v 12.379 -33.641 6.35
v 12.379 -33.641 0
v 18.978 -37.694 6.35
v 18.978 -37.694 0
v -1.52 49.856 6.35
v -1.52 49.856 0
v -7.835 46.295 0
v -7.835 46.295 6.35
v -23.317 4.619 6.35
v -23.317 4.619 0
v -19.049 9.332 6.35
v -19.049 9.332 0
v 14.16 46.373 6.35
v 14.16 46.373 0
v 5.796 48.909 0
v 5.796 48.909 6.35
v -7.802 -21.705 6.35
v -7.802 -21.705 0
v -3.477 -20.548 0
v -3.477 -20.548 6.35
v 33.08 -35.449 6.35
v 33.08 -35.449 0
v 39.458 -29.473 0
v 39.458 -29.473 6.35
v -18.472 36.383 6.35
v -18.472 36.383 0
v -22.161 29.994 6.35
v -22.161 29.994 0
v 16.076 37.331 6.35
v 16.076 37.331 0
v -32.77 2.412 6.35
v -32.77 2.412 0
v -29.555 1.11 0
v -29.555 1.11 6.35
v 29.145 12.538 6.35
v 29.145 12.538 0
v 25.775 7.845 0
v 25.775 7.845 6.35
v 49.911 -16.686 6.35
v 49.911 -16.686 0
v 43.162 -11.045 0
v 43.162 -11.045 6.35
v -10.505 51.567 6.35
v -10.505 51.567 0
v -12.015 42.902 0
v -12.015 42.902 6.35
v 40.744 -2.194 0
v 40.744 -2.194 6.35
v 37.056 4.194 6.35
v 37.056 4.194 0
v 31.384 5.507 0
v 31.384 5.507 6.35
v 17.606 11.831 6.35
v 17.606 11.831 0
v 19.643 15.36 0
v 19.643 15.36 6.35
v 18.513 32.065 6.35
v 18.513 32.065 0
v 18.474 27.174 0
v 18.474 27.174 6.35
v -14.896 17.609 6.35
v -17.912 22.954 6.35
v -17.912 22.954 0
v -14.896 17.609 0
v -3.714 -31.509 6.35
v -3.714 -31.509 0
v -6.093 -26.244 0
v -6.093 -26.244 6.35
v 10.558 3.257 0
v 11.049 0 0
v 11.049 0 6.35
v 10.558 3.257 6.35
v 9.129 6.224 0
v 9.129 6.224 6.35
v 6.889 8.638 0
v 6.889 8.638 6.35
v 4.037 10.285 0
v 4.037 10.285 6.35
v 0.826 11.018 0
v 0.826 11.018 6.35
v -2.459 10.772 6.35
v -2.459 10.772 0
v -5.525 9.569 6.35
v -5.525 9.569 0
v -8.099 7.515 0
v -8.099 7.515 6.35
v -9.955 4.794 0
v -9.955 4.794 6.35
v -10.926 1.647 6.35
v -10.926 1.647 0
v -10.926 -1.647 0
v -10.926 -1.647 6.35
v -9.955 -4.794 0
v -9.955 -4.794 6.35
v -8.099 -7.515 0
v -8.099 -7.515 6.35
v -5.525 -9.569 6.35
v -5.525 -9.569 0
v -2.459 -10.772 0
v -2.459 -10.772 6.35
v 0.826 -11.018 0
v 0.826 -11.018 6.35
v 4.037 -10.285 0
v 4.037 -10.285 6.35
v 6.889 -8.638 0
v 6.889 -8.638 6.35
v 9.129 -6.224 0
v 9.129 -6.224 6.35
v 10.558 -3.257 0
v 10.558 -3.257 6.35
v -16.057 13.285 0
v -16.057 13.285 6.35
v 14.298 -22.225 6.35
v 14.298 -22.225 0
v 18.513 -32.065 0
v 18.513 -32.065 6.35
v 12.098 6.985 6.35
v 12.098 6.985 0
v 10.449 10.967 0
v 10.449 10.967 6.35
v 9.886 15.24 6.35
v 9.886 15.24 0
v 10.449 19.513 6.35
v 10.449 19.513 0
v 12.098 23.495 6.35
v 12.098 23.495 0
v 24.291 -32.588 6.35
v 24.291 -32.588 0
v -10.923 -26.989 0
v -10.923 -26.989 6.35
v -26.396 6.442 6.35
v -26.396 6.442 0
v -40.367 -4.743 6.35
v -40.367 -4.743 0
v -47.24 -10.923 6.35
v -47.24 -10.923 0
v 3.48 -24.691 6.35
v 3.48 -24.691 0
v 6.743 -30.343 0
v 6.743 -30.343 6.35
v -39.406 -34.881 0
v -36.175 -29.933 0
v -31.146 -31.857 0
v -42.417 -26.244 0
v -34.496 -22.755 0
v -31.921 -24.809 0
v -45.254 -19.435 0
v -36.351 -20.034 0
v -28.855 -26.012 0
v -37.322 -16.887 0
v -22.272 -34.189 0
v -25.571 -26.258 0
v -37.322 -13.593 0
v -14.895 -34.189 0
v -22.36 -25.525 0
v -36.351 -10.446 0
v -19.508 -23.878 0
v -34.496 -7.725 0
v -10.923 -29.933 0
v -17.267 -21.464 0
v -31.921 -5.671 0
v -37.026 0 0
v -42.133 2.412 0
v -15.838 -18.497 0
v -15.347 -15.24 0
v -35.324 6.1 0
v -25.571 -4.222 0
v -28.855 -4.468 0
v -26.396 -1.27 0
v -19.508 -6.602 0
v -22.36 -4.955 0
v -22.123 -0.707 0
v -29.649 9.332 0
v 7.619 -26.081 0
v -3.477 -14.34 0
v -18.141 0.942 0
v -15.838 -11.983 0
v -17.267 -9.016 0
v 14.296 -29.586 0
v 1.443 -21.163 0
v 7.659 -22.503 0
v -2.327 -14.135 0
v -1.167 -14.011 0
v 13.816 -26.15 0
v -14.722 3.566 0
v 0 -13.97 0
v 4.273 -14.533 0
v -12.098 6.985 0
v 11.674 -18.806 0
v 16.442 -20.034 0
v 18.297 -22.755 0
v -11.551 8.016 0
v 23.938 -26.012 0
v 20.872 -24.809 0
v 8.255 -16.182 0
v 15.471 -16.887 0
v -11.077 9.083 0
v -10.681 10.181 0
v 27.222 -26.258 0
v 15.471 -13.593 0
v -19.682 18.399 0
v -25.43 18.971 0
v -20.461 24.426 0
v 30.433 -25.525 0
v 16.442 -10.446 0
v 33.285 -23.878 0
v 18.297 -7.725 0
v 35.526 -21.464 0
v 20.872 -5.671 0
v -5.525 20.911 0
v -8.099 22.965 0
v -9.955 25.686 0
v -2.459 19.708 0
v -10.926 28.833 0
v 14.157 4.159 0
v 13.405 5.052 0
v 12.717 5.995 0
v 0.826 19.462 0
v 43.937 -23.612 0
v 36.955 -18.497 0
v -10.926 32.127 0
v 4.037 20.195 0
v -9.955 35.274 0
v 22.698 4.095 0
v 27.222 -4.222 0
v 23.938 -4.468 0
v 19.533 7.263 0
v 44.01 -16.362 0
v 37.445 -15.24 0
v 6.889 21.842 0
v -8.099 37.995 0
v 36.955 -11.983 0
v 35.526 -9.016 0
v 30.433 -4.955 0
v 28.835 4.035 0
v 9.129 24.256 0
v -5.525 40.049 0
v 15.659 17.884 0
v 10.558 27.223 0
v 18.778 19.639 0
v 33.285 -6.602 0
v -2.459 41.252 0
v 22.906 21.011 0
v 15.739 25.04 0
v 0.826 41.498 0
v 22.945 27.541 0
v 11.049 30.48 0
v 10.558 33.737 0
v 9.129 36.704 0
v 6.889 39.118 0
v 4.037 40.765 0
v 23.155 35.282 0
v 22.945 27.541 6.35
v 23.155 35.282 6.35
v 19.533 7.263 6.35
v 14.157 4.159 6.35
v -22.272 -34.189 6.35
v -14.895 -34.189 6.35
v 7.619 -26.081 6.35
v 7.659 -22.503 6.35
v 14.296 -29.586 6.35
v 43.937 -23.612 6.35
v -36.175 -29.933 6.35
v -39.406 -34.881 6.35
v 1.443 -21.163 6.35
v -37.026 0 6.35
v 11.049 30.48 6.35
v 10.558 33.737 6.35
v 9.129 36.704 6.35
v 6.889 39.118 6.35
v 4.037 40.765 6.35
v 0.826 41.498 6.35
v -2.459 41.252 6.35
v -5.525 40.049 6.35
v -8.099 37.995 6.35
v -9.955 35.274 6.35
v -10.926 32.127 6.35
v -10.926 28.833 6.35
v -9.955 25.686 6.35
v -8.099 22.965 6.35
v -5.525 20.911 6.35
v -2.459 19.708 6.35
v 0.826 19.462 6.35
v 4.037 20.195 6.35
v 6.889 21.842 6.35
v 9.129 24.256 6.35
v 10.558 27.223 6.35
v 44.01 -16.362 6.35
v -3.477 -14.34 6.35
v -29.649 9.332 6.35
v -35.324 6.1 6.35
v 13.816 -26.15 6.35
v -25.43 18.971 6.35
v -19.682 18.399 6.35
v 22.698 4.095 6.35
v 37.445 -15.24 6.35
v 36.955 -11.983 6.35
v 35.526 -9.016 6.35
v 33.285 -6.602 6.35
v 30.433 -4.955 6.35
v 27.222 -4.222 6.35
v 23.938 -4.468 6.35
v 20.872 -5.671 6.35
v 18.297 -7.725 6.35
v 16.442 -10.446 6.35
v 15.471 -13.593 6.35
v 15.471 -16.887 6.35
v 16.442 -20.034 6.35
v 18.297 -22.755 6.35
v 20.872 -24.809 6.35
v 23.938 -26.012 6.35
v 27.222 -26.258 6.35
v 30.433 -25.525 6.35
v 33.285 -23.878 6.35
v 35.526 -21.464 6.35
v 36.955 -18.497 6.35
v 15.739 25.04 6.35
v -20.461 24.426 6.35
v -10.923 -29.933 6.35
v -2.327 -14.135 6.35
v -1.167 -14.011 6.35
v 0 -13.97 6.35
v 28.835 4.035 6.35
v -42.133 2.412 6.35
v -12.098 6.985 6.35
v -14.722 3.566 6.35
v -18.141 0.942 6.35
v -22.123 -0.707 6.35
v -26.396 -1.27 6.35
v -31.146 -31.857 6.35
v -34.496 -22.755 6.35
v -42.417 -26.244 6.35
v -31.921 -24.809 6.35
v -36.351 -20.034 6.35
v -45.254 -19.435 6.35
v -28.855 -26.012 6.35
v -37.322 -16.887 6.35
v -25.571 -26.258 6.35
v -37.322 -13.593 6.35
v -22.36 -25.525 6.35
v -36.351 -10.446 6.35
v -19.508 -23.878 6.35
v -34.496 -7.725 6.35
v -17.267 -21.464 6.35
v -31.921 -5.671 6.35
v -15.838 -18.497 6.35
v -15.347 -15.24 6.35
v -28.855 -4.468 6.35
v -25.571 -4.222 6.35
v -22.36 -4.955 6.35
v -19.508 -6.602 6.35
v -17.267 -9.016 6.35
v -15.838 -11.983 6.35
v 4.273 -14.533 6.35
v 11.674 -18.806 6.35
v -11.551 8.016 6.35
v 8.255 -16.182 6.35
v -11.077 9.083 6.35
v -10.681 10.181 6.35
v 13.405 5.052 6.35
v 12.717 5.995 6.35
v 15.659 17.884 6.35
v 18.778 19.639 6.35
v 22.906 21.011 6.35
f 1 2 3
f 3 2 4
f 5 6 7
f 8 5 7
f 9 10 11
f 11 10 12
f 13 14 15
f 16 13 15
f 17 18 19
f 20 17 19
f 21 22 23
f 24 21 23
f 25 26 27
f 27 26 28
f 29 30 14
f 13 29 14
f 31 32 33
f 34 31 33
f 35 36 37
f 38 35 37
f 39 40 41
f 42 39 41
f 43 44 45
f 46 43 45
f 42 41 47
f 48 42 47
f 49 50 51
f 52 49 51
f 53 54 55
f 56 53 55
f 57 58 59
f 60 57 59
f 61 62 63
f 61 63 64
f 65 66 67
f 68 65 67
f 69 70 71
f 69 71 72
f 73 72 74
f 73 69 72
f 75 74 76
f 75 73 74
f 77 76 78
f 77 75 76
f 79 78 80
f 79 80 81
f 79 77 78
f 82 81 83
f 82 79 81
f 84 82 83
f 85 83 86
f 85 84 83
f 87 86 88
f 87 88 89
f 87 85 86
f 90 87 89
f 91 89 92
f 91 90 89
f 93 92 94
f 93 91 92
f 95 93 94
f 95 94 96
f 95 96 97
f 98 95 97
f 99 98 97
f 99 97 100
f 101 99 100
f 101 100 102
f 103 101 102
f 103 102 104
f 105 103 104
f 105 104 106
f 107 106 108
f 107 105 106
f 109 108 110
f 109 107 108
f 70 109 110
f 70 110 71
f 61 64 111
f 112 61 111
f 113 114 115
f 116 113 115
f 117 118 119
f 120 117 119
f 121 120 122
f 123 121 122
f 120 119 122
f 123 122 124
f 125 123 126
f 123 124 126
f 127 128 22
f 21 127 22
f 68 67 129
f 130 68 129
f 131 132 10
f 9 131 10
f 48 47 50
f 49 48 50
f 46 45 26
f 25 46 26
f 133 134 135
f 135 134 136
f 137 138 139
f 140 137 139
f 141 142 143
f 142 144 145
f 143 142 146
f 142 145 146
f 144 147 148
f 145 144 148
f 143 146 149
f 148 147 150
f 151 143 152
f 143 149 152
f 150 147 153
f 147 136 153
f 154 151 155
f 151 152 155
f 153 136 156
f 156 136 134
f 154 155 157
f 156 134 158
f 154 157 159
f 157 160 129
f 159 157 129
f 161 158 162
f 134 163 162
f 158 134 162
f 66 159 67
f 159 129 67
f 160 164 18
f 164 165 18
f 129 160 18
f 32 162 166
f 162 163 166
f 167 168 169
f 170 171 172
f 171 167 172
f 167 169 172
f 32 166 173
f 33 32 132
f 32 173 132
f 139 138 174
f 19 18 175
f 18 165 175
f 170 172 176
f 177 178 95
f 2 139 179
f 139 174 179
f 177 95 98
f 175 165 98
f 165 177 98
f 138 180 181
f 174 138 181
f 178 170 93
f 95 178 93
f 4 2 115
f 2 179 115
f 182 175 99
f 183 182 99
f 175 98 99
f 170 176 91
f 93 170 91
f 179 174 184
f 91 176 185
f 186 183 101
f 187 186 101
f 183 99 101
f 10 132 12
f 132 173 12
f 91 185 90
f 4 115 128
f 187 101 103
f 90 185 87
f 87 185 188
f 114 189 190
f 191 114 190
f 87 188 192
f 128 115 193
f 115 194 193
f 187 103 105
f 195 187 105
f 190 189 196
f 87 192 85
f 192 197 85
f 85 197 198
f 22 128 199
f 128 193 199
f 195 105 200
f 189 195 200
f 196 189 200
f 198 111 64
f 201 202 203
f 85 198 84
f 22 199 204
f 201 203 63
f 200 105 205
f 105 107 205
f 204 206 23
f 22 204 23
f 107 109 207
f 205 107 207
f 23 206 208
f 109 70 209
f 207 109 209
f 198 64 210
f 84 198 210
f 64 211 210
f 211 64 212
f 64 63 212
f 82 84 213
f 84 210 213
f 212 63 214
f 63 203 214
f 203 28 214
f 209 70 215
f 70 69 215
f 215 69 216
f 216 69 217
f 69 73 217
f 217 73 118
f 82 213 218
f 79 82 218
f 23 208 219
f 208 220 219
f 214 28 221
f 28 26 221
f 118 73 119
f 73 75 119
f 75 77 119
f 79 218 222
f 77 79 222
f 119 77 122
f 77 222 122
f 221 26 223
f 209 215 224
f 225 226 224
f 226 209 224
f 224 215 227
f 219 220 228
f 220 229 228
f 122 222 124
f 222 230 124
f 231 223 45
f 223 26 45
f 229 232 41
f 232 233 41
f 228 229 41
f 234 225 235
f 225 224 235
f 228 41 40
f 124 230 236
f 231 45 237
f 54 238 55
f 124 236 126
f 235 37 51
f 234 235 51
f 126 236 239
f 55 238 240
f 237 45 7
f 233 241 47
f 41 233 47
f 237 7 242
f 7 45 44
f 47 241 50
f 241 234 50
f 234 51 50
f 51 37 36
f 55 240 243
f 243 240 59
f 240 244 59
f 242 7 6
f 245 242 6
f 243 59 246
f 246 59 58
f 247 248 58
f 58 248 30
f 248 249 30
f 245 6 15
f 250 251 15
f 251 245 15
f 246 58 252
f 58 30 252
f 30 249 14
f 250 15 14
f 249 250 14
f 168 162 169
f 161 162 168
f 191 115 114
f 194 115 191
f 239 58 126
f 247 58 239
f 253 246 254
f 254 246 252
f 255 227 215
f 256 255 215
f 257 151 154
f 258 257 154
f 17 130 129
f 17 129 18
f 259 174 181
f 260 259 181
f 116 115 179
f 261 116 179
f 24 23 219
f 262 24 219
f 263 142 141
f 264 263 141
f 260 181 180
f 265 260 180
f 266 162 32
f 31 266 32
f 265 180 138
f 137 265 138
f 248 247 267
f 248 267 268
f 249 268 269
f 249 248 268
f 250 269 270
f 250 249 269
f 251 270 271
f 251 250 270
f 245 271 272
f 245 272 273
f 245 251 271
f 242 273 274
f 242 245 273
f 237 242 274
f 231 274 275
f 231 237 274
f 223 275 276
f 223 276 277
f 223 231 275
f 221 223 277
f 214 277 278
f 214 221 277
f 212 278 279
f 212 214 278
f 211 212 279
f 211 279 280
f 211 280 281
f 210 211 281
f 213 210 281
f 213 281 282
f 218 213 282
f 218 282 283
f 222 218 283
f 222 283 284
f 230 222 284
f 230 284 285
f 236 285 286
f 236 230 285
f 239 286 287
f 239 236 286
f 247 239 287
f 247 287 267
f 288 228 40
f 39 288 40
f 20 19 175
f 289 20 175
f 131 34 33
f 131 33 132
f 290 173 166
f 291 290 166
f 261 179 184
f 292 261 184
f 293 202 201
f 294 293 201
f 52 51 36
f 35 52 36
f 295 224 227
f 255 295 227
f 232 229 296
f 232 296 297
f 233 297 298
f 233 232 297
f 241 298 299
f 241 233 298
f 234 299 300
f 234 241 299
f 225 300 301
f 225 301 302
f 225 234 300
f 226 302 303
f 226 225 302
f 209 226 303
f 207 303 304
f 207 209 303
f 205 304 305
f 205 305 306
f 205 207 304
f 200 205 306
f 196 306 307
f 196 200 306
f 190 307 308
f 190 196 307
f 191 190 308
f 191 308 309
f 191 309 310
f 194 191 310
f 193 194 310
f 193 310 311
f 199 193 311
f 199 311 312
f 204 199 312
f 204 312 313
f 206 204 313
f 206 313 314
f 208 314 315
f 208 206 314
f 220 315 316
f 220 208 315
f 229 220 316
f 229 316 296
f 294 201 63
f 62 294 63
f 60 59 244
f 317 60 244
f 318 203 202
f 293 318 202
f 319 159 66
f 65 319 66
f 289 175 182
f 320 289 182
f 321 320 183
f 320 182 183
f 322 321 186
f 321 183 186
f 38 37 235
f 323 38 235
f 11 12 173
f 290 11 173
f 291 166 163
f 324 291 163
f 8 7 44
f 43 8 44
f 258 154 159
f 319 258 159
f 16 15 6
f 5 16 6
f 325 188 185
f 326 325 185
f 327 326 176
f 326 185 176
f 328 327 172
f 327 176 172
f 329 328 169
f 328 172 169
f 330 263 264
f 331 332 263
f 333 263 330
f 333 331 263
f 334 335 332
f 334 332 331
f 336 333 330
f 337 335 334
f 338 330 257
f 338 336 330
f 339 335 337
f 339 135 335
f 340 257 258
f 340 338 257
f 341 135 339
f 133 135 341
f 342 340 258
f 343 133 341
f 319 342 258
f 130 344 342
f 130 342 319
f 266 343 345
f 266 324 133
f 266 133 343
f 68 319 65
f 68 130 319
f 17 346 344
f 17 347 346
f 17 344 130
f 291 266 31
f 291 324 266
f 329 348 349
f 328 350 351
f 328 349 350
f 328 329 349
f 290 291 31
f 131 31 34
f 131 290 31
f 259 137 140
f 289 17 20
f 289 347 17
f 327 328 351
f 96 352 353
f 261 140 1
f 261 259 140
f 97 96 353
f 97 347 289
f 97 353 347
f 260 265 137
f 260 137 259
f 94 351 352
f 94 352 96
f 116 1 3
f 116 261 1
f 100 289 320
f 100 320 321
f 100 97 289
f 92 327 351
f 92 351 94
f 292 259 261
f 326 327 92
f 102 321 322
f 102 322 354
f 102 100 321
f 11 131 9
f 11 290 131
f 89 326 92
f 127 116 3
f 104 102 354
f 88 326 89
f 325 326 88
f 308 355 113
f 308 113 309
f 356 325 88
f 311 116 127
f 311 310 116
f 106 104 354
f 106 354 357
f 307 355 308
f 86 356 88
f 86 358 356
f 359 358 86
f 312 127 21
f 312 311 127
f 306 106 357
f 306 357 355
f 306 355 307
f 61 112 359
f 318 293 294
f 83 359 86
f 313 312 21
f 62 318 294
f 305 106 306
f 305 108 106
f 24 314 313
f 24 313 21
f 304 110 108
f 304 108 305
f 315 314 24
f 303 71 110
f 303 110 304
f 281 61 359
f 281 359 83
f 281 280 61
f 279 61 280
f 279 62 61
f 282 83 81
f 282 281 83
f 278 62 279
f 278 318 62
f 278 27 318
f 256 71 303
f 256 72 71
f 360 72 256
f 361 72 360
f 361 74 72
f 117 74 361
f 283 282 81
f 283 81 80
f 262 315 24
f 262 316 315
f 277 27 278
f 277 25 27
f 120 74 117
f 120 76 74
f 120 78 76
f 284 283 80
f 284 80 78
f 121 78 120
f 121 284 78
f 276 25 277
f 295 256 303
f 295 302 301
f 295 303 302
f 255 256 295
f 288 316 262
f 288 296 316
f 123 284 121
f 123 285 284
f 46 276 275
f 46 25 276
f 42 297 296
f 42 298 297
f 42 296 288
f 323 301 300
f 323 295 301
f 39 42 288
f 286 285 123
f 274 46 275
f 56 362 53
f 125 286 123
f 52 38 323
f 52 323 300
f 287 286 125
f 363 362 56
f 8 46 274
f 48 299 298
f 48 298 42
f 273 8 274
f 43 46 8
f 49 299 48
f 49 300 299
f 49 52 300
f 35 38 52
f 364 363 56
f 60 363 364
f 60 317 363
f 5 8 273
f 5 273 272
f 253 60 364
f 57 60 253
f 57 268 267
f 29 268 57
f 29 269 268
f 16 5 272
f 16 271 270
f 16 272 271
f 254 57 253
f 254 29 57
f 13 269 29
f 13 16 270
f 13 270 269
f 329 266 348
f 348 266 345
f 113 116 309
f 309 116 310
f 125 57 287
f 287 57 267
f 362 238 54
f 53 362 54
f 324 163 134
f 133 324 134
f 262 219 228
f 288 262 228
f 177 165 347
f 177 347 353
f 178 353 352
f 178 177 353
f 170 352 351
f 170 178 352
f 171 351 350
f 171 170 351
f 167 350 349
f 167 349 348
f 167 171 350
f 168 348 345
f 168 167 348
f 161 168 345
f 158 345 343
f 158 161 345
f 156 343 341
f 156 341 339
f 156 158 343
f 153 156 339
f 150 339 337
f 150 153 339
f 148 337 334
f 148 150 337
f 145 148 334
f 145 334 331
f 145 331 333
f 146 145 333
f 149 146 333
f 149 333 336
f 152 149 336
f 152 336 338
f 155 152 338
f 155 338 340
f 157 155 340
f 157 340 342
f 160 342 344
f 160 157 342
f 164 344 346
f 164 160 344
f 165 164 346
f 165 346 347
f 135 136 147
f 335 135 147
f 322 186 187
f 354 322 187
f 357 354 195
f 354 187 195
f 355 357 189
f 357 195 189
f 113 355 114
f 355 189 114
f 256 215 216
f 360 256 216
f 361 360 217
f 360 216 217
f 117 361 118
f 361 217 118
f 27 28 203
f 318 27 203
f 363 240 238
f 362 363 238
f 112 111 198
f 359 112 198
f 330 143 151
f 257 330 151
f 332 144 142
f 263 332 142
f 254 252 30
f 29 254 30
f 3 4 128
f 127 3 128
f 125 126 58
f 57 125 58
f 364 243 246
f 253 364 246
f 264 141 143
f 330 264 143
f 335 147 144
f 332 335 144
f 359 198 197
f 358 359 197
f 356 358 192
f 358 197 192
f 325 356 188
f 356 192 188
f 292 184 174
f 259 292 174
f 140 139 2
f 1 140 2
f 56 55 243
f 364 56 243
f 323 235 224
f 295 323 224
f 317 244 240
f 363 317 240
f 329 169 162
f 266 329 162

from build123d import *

# Parameters (mm, degrees)
F0_R     = 11.049
F1_DEPTH = 6.35


with BuildPart() as f1:
    # F0 (on Top) → F1 (new body)
    with BuildSketch(Plane.XY):
        with BuildLine():
            ThreePointArc((-2.36e-08, -13.97), (9.8782817248, -9.8782817415), (13.97, 0))
            ThreePointArc((13.97, 0), (13.8409108955, 1.8947521167), (13.4560292651, 3.754487504))
            ThreePointArc((13.4560292651, 3.754487504), (12.8788953824, 5.4124812914), (12.0983749493, 6.9849998988))
            ThreePointArc((12.0983749493, 6.9849998988), (1.7521013954, 13.8596912195), (-9.9794961892, 9.7760194256))
            ThreePointArc((-9.9794961892, 9.7760194256), (-11.1267940276, 8.4472098748), (-12.0983748995, 6.9849999851))
            ThreePointArc((-12.0983748995, 6.9849999851), (-12.8788953564, -5.4124813532), (-3.4765330758, -13.5305069296))
            ThreePointArc((-3.4765330758, -13.5305069296), (-1.7521013491, -13.8596912254), (-2.36e-08, -13.97))
        make_face()
        Circle(F0_R, mode=Mode.SUBTRACT)
        with BuildLine():
            ThreePointArc((13.4560292651, 3.754487504), (13.8409108955, 1.8947521167), (13.97, 0))
            ThreePointArc((13.97, 0), (9.8782817248, -9.8782817415), (-2.36e-08, -13.97))
            ThreePointArc((-2.36e-08, -13.97), (8.2549999898, -16.1819205776), (14.2980794165, -22.225))
            ThreePointArc((14.2980794165, -22.225), (14.2980794165, -8.255), (26.3964543074, -1.27))
            ThreePointArc((26.3964543074, -1.27), (19.7017499565, 0.1482461704), (14.1572259578, 4.1593236033))
            Line((14.1572259578, 4.1593236033), (13.4560292651, 3.754487504))
        make_face()
        with BuildLine():
            ThreePointArc((12.0983749493, 6.9849998988), (12.8788953824, 5.4124812914), (13.4560292651, 3.754487504))
            Line((13.4560292651, 3.754487504), (14.1572259578, 4.1593236033))
            ThreePointArc((14.1572259578, 4.1593236033), (13.0527933882, 5.5175099241), (12.0983749493, 6.9849998988))
        make_face()
        with BuildLine():
            ThreePointArc((-3.4765330758, -14.3401791282), (-1.7480928878, -14.0628056217), (-2.36e-08, -13.97))
            ThreePointArc((-2.36e-08, -13.97), (-1.7521013491, -13.8596912254), (-3.4765330758, -13.5305069296))
            Line((-3.4765330758, -13.5305069296), (-3.4765330758, -14.3401791282))
        make_face()
        with BuildLine():
            ThreePointArc((-9.9794961892, 9.7760194256), (1.7521013954, 13.8596912195), (12.0983749493, 6.9849998988))
            ThreePointArc((12.0983749493, 6.9849998988), (9.8864543074, 15.2399999416), (12.0983748909, 23.495))
            ThreePointArc((12.0983748909, 23.495), (0, 16.51), (-12.0983748909, 23.495))
            ThreePointArc((-12.0983748909, 23.495), (-9.9792599278, 16.9880928761), (-10.680692882, 10.1808555249))
            Line((-10.680692882, 10.1808555249), (-9.9794961892, 9.7760194256))
        make_face()
        with BuildLine():
            Line((19.5333762679, 7.2632454321), (14.1572259578, 4.1593236033))
            ThreePointArc((14.1572259578, 4.1593236033), (19.7017499565, 0.1482461704), (26.3964543074, -1.27))
            ThreePointArc((26.3964543074, -1.27), (36.2747360405, -5.3617182668), (40.3664543073, -15.24))
            ThreePointArc((40.3664543073, -15.24), (30.0121563674, -28.7339837933), (14.2980794165, -22.225))
            Line((14.2980794165, -22.225), (18.5129530728, -32.0653753202))
            Line((18.5129530728, -32.0653753202), (14.2964770949, -29.5855224255))
            Line((14.2964770949, -29.5855224255), (13.8160917687, -26.1500289008))
            Line((13.8160917687, -26.1500289008), (7.6188843675, -26.0812350595))
            Line((7.6188843675, -26.0812350595), (7.6586053261, -22.5030220397))
            Line((7.6586053261, -22.5030220397), (1.4429174314, -21.1629279691))
            Line((1.4429174314, -21.1629279691), (3.4801004676, -24.6914324922))
            Line((3.4801004676, -24.6914324922), (6.7429192586, -30.342800414))
            Line((6.7429192586, -30.342800414), (12.3789807439, -33.641130461))
            Line((12.3789807439, -33.641130461), (18.9779134399, -37.6940080274))
            Line((18.9779134399, -37.6940080274), (24.2913333671, -32.5875241804))
            Line((24.2913333671, -32.5875241804), (33.0798736321, -35.4493195164))
            Line((33.0798736321, -35.4493195164), (39.4581922442, -29.4734863592))
            Line((39.4581922442, -29.4734863592), (43.9366570858, -23.6116887214))
            Line((43.9366570858, -23.6116887214), (44.0099485225, -16.3618282657))
            Line((44.0099485225, -16.3618282657), (49.9108565981, -16.6858625943))
            Line((49.9108565981, -16.6858625943), (43.1618704508, -11.0453059989))
            Line((43.1618704508, -11.0453059989), (40.7443994954, -2.1940317001))
            Line((40.7443994954, -2.1940317001), (37.0559956245, 4.1944712032))
            Line((37.0559956245, 4.1944712032), (31.3842575072, 5.5065100534))
            Line((31.3842575072, 5.5065100534), (29.1446442552, 12.5378607885))
            Line((29.1446442552, 12.5378607885), (25.7749684952, 7.8452786686))
            Line((25.7749684952, 7.8452786686), (28.8350082813, 4.0347003266))
            Line((28.8350082813, 4.0347003266), (22.6981406857, 4.0953499054))
            Line((22.6981406857, 4.0953499054), (19.5333762679, 7.2632454321))
        make_face()
        with BuildLine():
            Line((-3.4765330758, -14.3401791282), (-3.4765330758, -13.5305069296))
            ThreePointArc((-3.4765330758, -13.5305069296), (-12.8788953564, -5.4124813532), (-12.0983748995, 6.9849999851))
            ThreePointArc((-12.0983748995, 6.9849999851), (-18.1414543148, 0.9419205792), (-26.3964543073, -1.27))
            ThreePointArc((-26.3964543073, -1.27), (-16.5181725742, -5.3617182668), (-12.4264543073, -15.24))
            ThreePointArc((-12.4264543073, -15.24), (-12.9024705141, -18.8557020601), (-14.2980794165, -22.225))
            ThreePointArc((-14.2980794165, -22.225), (-9.7224900287, -17.1363390465), (-3.4765330758, -14.3401791282))
        make_face()
        with BuildLine():
            ThreePointArc((26.3964543074, -1.27), (14.2980794165, -8.255), (14.2980794165, -22.225))
            ThreePointArc((14.2980794165, -22.225), (30.0121563674, -28.7339837933), (40.3664543073, -15.24))
            ThreePointArc((40.3664543073, -15.24), (36.2747360405, -5.3617182668), (26.3964543074, -1.27))
        make_face()
        with Locations((26.3964543073, -15.24)):
            Circle(F0_R, mode=Mode.SUBTRACT)
        with BuildLine():
            Line((-3.4765330758, -20.5480227857), (-3.4765330758, -14.3401791282))
            ThreePointArc((-3.4765330758, -14.3401791282), (-9.7224900287, -17.1363390465), (-14.2980794165, -22.225))
            ThreePointArc((-14.2980794165, -22.225), (-38.4948291982, -22.225), (-26.3964543073, -1.27))
            Line((-26.3964543073, -1.27), (-37.0259061456, 0))
            Line((-37.0259061456, 0), (-32.7700525522, 2.4116488639))
            Line((-32.7700525522, 2.4116488639), (-29.5546352221, 1.1099279977))
            Line((-29.5546352221, 1.1099279977), (-26.3964543073, 6.442470119))
            Line((-26.3964543073, 6.442470119), (-23.3174914114, 4.6189642499))
            Line((-23.3174914114, 4.6189642499), (-19.0490919554, 9.3318608334))
            Line((-19.0490919554, 9.3318608334), (-23.1234580278, 9.3318608334))
            Line((-23.1234580278, 9.3318608334), (-29.6490956098, 9.3318608334))
            Line((-29.6490956098, 9.3318608334), (-35.3235639632, 6.1000534333))
            Line((-35.3235639632, 6.1000534333), (-42.1329252422, 2.4116488639))
            Line((-42.1329252422, 2.4116488639), (-40.3672904702, -4.7431496975))
            Line((-40.3672904702, -4.7431496975), (-47.2399480641, -10.9233511612))
            Line((-47.2399480641, -10.9233511612), (-45.2538840473, -19.4350536913))
            Line((-45.2538840473, -19.4350536913), (-42.4166508019, -26.2444168329))
            Line((-42.4166508019, -26.2444168329), (-36.1747331917, -29.9328193069))
            Line((-36.1747331917, -29.9328193069), (-39.4058091898, -34.8811384415))
            Line((-39.4058091898, -34.8811384415), (-31.146450813, -31.8566232858))
            Line((-31.146450813, -31.8566232858), (-22.2722869366, -34.1886691749))
            Line((-22.2722869366, -34.1886691749), (-14.8954791948, -34.1886691749))
            Line((-14.8954791948, -34.1886691749), (-10.9233511612, -29.9328193069))
            Line((-10.9233511612, -29.9328193069), (-3.7142161756, -31.5089327035))
            Line((-3.7142161756, -31.5089327035), (-6.0932736208, -26.2444168329))
            Line((-6.0932736208, -26.2444168329), (-10.9233511612, -26.9891998532))
            Line((-10.9233511612, -26.9891998532), (-7.8023932874, -21.7048414052))
            Line((-7.8023932874, -21.7048414052), (-3.4765330758, -20.5480227857))
        make_face()
        with BuildLine():
            ThreePointArc((-12.0983748995, 6.9849999851), (-11.1267940276, 8.4472098748), (-9.9794961892, 9.7760194256))
            Line((-9.9794961892, 9.7760194256), (-10.680692882, 10.1808555249))
            ThreePointArc((-10.680692882, 10.1808555249), (-11.3047004812, 8.5452956412), (-12.0983748995, 6.9849999851))
        make_face()
        with BuildLine():
            ThreePointArc((-12.0983748909, 23.495), (0, 16.51), (12.0983748909, 23.495))
            ThreePointArc((12.0983748909, 23.495), (13.4939837933, 26.8642979399), (13.97, 30.48))
            ThreePointArc((13.97, 30.48), (-3.6157020601, 43.9739837933), (-12.0983748909, 23.495))
        make_face()
        with Locations((0, 30.48)):
            Circle(F0_R, mode=Mode.SUBTRACT)
        with BuildLine():
            ThreePointArc((13.97, 30.48), (13.4939837933, 26.8642979399), (12.0983748909, 23.495))
            Line((12.0983748909, 23.495), (18.5129530728, 32.0653753202))
            Line((18.5129530728, 32.0653753202), (18.4735754573, 27.1738735616))
            Line((18.4735754573, 27.1738735616), (15.7385434534, 25.0401009031))
            Line((15.7385434534, 25.0401009031), (18.7775699398, 19.6387649405))
            Line((18.7775699398, 19.6387649405), (15.6588860852, 17.8840577898))
            Line((15.6588860852, 17.8840577898), (17.606174524, 11.8310671357))
            Line((17.606174524, 11.8310671357), (19.6433575602, 15.3595716588))
            Line((19.6433575602, 15.3595716588), (22.9061763512, 21.0109395806))
            Line((22.9061763512, 21.0109395806), (22.9445832193, 27.5410770276))
            Line((22.9445832193, 27.5410770276), (23.1550118023, 35.2823591635))
            Line((23.1550118023, 35.2823591635), (16.0759571031, 37.3306738779))
            Line((16.0759571031, 37.3306738779), (14.160074432, 46.3726706775))
            Line((14.160074432, 46.3726706775), (5.7956918031, 48.9085400505))
            Line((5.7956918031, 48.9085400505), (-1.5200062839, 49.8561055544))
            Line((-1.5200062839, 49.8561055544), (-7.8352153308, 46.2946475726))
            Line((-7.8352153308, 46.2946475726), (-10.5050474083, 51.5670010358))
            Line((-10.5050474083, 51.5670010358), (-12.0154196378, 42.9019292847))
            Line((-12.0154196378, 42.9019292847), (-18.4721125587, 36.382700875))
            Line((-18.4721125587, 36.382700875), (-22.1605164296, 29.9941979717))
            Line((-22.1605164296, 29.9941979717), (-20.460906346, 24.4263092535))
            Line((-20.460906346, 24.4263092535), (-25.4304280796, 18.971071915))
            Line((-25.4304280796, 18.971071915), (-19.6816948744, 18.3991381643))
            Line((-19.6816948744, 18.3991381643), (-17.9116571201, 22.9544995267))
            Line((-17.9116571201, 22.9544995267), (-14.8957473983, 17.6094914998))
            Line((-14.8957473983, 17.6094914998), (-16.0568431921, 13.2847773536))
            Line((-16.0568431921, 13.2847773536), (-10.680692882, 10.1808555249))
            ThreePointArc((-10.680692882, 10.1808555249), (-9.9792599278, 16.9880928761), (-12.0983748909, 23.495))
            ThreePointArc((-12.0983748909, 23.495), (-3.6157020601, 43.9739837933), (13.97, 30.48))
        make_face()
        with BuildLine():
            ThreePointArc((-26.3964543073, -1.27), (-38.4948291982, -22.225), (-14.2980794165, -22.225))
            ThreePointArc((-14.2980794165, -22.225), (-12.9024705141, -18.8557020601), (-12.4264543073, -15.24))
            ThreePointArc((-12.4264543073, -15.24), (-16.5181725742, -5.3617182668), (-26.3964543073, -1.27))
        make_face()
        with Locations((-26.3964543073, -15.24)):
            Circle(F0_R, mode=Mode.SUBTRACT)
    extrude(amount=F1_DEPTH)


solid = f1.part
